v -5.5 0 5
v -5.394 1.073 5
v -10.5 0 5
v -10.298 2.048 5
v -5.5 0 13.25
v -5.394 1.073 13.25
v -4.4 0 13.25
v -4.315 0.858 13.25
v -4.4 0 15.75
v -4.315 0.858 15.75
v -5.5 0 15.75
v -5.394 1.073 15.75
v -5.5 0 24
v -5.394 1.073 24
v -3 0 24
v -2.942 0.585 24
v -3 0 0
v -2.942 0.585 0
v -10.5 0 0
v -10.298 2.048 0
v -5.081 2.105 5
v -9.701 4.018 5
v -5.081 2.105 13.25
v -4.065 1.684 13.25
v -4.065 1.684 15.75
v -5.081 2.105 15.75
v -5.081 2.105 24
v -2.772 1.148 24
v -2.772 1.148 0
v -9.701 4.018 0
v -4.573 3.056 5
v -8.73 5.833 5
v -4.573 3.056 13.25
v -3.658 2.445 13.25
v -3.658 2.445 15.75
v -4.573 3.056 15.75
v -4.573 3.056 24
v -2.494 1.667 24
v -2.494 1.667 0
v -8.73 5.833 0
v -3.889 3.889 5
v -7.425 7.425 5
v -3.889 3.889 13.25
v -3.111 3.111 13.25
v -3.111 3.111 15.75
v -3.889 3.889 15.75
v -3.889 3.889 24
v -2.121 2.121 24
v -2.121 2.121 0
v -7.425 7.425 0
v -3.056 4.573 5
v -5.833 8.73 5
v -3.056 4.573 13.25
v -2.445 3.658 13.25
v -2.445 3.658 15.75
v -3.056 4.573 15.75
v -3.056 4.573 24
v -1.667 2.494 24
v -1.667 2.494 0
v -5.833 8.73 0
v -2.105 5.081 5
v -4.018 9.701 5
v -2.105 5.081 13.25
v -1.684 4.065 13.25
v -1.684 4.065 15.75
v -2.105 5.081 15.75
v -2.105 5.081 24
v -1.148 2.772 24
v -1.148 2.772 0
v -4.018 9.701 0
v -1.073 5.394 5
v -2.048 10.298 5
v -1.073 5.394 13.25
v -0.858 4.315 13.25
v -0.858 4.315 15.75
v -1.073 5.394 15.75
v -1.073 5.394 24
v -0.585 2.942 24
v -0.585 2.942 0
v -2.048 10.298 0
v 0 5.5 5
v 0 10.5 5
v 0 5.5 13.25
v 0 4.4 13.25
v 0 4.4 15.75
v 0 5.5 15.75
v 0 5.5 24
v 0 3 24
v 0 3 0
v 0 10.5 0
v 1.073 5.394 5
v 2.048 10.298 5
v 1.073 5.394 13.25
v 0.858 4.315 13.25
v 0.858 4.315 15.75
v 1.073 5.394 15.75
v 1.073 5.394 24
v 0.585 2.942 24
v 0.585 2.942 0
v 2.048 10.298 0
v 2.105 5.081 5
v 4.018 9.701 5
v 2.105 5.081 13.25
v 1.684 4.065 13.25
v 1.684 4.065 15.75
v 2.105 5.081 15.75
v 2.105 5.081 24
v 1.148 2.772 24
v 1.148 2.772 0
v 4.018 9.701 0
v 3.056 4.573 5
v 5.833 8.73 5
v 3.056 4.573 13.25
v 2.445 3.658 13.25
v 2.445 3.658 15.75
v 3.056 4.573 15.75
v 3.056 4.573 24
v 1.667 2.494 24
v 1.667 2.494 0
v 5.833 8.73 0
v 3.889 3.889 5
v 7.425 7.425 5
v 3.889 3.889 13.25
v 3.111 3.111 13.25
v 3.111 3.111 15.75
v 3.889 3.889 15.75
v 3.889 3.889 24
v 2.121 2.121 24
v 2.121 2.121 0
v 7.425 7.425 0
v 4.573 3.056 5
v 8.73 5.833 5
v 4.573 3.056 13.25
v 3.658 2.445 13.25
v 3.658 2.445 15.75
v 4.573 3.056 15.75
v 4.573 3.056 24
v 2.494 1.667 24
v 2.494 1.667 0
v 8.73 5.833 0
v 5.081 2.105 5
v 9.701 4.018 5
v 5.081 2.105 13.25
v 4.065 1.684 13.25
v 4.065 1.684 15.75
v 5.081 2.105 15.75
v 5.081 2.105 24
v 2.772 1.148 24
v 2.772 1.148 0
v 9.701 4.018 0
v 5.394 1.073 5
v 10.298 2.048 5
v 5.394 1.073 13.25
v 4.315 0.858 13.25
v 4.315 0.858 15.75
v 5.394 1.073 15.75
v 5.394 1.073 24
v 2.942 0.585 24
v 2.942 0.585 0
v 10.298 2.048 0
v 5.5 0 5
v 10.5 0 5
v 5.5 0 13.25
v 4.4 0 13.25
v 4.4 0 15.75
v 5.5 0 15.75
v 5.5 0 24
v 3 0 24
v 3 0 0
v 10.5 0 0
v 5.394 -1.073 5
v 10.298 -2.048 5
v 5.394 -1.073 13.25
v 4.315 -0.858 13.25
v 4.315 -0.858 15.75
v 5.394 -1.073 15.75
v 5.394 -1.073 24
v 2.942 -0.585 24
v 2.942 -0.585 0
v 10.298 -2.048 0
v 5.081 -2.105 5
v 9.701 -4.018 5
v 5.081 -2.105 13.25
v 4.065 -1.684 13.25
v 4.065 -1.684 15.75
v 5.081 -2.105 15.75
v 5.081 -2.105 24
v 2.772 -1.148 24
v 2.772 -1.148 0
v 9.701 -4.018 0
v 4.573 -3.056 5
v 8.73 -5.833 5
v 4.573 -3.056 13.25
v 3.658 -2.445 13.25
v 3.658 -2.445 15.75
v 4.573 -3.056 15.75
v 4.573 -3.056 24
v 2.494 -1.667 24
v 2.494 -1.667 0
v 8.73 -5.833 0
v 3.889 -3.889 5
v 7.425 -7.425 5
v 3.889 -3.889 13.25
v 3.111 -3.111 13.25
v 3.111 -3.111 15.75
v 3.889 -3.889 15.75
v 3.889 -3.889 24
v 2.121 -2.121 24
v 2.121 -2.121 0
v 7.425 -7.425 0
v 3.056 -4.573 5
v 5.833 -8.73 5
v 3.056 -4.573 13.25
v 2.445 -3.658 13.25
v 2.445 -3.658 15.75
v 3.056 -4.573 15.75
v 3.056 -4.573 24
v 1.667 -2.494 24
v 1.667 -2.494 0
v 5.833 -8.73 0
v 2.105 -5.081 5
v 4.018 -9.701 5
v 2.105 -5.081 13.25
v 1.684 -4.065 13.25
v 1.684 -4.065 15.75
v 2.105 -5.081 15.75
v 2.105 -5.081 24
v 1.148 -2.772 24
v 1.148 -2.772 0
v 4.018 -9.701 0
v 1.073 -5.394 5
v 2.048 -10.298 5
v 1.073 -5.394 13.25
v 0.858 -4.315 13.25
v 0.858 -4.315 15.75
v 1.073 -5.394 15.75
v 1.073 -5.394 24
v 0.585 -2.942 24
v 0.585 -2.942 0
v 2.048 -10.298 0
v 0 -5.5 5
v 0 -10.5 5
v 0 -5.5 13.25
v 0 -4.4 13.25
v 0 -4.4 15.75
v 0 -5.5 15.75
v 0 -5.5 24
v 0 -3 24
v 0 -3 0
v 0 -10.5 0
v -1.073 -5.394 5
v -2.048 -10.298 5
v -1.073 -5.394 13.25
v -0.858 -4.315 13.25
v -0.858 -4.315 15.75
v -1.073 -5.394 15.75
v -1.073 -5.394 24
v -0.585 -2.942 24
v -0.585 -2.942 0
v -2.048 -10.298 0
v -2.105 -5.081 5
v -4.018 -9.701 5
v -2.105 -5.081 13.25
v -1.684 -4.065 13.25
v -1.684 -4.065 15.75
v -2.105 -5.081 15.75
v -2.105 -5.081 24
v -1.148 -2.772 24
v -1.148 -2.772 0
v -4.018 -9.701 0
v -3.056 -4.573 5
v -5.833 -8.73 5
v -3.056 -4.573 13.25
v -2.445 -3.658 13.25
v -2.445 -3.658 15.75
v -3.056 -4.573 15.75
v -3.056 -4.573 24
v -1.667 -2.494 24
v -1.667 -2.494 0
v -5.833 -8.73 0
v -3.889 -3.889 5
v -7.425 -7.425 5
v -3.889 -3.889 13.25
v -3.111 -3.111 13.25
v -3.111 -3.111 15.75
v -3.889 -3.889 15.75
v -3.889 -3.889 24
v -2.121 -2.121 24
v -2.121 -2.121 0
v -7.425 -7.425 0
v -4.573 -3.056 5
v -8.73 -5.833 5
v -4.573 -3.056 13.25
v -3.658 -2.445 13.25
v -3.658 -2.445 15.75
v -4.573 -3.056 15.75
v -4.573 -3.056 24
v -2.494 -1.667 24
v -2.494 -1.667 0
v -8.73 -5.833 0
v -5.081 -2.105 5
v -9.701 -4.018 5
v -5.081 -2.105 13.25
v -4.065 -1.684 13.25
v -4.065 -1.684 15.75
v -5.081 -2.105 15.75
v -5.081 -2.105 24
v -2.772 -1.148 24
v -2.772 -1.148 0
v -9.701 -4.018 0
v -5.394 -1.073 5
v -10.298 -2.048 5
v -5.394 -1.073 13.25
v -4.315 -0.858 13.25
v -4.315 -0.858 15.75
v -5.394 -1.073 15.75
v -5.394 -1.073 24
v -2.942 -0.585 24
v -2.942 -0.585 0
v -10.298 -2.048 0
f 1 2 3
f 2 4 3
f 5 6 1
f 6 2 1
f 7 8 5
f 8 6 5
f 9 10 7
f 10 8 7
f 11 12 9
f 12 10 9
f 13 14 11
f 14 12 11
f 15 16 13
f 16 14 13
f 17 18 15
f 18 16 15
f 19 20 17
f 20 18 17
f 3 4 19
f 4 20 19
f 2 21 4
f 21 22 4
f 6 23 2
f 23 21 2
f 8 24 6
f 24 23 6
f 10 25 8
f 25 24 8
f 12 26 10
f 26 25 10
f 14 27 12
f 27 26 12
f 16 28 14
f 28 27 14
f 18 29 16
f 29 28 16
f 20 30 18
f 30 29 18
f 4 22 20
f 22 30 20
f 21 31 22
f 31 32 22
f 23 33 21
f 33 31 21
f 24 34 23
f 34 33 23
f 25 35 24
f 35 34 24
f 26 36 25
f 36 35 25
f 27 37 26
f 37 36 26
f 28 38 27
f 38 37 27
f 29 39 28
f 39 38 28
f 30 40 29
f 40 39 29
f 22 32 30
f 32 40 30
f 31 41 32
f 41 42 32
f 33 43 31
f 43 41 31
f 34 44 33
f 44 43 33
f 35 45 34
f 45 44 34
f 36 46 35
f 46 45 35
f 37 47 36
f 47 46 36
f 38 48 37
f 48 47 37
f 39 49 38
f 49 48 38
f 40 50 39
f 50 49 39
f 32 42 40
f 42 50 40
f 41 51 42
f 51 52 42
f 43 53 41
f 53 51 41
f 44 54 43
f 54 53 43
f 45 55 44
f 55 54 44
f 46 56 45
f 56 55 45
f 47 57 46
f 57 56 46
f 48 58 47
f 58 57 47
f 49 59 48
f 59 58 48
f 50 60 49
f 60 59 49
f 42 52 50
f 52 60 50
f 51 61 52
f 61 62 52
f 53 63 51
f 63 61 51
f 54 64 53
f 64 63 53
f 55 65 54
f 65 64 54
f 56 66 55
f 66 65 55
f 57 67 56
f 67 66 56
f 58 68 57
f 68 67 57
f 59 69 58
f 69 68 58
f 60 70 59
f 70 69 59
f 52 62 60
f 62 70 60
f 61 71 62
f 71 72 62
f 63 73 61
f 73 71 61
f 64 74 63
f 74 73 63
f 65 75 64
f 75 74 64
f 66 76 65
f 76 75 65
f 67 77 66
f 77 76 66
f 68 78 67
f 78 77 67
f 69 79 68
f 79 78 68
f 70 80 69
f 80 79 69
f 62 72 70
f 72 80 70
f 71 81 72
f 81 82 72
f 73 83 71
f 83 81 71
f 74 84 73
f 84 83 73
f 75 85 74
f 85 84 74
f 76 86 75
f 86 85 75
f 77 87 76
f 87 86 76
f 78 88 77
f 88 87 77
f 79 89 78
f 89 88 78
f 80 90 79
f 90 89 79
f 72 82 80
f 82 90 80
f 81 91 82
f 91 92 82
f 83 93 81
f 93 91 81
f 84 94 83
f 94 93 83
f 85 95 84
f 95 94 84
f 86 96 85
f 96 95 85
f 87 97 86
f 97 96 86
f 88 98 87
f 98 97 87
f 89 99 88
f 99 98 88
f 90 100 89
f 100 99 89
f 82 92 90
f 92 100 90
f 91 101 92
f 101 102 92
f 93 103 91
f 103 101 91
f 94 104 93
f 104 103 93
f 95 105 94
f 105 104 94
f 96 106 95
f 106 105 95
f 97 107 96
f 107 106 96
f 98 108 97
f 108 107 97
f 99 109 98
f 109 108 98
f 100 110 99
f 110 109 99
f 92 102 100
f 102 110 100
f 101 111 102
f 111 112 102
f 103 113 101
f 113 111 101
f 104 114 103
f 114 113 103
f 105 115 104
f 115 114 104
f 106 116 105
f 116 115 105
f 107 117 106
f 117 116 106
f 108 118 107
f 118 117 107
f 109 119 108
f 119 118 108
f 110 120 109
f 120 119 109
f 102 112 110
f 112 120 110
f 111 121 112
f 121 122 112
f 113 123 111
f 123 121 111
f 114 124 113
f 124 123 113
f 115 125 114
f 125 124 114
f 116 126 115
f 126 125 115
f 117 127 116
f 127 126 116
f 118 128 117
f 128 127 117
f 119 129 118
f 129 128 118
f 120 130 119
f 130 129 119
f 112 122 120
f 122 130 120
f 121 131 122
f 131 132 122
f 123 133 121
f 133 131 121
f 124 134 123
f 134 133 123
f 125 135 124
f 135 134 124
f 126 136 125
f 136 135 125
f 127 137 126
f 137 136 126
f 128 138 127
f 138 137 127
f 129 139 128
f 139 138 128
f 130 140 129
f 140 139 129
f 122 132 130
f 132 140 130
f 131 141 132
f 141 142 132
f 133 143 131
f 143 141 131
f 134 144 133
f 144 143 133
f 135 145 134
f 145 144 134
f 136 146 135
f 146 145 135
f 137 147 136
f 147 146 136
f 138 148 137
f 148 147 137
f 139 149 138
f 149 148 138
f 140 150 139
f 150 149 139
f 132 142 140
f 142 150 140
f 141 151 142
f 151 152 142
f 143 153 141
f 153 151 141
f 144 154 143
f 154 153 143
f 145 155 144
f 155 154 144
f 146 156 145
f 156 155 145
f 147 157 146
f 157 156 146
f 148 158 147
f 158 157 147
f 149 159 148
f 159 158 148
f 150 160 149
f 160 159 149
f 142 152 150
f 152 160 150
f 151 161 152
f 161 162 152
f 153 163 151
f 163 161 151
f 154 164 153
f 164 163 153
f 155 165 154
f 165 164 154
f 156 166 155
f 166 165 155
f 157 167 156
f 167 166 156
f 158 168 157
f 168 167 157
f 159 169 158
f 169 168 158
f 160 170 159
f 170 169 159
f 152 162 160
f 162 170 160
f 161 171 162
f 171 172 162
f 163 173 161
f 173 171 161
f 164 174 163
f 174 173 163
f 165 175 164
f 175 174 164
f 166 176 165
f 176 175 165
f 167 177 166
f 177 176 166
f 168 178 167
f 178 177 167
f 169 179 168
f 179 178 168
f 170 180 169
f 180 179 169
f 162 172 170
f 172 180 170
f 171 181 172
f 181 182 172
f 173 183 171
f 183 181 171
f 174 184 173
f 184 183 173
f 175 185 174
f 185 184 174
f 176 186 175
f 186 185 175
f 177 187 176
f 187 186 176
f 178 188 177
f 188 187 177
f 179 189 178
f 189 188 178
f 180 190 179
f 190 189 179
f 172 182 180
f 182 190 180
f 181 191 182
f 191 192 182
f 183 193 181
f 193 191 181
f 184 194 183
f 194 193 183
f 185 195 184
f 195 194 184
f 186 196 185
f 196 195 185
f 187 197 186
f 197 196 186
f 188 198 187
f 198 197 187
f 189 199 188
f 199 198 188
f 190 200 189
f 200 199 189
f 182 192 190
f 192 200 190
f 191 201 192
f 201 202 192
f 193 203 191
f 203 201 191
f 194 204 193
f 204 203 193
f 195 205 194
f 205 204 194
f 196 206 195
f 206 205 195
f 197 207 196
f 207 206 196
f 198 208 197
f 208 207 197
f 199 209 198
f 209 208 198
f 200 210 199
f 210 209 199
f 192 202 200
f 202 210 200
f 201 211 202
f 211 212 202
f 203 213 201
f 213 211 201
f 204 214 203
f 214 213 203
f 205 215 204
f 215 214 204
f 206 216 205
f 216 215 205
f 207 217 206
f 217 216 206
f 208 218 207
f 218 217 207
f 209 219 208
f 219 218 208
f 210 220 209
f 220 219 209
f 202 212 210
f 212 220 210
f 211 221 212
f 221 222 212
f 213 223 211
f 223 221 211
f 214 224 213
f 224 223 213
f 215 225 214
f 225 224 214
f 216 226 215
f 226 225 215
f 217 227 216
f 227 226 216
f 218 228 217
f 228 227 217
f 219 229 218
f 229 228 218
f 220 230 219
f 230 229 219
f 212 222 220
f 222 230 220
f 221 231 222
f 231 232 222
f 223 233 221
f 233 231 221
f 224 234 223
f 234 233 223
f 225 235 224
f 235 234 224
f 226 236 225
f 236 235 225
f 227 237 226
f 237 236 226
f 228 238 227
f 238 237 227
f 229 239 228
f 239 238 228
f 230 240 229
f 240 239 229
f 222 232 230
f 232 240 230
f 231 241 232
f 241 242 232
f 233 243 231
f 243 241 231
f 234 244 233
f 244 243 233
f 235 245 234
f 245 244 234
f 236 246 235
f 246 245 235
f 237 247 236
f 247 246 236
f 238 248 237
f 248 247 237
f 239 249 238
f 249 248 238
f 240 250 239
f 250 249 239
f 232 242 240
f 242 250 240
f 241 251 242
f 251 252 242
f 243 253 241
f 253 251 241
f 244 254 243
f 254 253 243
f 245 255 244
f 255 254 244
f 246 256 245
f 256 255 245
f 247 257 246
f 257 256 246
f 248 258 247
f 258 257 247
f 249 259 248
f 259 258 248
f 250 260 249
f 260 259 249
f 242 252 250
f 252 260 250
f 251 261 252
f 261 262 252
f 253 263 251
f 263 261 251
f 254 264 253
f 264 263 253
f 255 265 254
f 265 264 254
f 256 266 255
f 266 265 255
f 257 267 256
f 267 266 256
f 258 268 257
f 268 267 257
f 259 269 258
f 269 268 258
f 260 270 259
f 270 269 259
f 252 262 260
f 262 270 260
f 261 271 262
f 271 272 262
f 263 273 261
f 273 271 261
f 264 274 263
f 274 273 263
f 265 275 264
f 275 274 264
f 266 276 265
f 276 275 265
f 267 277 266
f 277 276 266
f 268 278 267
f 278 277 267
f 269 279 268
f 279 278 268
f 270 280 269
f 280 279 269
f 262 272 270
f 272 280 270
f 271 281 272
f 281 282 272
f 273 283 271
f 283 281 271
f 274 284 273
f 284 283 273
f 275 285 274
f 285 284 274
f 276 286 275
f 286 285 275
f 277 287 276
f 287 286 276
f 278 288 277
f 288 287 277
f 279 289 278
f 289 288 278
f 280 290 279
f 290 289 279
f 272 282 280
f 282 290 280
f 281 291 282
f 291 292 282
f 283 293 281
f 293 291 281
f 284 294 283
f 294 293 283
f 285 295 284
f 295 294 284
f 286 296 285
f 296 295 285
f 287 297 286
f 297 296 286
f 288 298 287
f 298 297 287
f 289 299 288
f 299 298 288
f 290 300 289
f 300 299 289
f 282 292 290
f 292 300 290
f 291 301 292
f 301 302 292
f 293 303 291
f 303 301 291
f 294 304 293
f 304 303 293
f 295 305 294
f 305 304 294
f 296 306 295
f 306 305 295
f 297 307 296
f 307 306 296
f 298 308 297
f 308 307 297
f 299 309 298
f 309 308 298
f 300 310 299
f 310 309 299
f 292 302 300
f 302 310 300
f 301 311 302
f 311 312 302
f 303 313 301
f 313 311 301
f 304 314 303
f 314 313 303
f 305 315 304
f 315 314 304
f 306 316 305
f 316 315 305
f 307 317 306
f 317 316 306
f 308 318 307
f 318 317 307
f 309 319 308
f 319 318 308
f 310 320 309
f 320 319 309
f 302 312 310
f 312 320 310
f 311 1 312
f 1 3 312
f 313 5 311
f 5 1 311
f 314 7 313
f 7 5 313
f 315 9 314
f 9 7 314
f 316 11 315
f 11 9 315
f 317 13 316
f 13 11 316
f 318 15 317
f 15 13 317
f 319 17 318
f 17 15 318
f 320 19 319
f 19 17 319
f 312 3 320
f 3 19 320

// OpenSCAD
$fn = 32;

// ----------------------------------------------------------------------
// Grooved revolve: flanged, bore R3
// ----------------------------------------------------------------------

// --- parameters (mm) ---
bore_r = 3;               // bore radius
outer_r = 5.5;            // outer radius of the body
total_h = 24;             // overall height, Z
wall = 2.5;               // radial wall thickness
groove_w = 2.5;           // groove width
groove_d = 1.1;           // groove depth
grooves = 1;              // number of outer grooves
flange_r = 10.5;          // flange radius
flange_h = 5;             // flange height

bbox_x = 2 * flange_r;  // full diameter
bore_d = 2 * bore_r;  // bore diameter
body_d = 2 * outer_r;  // body diameter
flange_d = 2 * flange_r;  // flange diameter
revolve_angle = 360;  // full turn around the Z axis

profile = [[3, 0], [5.5, 0], [10.5, 0], [10.5, 5], [5.5, 5], [5.5, 13.25], [4.4, 13.25], [4.4, 15.75], [5.5, 15.75], [5.5, 24], [3, 24]];  // primary outline, 11 points, counter clockwise

// --- the one profile operation ---
rotate_extrude(angle = revolve_angle) polygon(points = profile);
